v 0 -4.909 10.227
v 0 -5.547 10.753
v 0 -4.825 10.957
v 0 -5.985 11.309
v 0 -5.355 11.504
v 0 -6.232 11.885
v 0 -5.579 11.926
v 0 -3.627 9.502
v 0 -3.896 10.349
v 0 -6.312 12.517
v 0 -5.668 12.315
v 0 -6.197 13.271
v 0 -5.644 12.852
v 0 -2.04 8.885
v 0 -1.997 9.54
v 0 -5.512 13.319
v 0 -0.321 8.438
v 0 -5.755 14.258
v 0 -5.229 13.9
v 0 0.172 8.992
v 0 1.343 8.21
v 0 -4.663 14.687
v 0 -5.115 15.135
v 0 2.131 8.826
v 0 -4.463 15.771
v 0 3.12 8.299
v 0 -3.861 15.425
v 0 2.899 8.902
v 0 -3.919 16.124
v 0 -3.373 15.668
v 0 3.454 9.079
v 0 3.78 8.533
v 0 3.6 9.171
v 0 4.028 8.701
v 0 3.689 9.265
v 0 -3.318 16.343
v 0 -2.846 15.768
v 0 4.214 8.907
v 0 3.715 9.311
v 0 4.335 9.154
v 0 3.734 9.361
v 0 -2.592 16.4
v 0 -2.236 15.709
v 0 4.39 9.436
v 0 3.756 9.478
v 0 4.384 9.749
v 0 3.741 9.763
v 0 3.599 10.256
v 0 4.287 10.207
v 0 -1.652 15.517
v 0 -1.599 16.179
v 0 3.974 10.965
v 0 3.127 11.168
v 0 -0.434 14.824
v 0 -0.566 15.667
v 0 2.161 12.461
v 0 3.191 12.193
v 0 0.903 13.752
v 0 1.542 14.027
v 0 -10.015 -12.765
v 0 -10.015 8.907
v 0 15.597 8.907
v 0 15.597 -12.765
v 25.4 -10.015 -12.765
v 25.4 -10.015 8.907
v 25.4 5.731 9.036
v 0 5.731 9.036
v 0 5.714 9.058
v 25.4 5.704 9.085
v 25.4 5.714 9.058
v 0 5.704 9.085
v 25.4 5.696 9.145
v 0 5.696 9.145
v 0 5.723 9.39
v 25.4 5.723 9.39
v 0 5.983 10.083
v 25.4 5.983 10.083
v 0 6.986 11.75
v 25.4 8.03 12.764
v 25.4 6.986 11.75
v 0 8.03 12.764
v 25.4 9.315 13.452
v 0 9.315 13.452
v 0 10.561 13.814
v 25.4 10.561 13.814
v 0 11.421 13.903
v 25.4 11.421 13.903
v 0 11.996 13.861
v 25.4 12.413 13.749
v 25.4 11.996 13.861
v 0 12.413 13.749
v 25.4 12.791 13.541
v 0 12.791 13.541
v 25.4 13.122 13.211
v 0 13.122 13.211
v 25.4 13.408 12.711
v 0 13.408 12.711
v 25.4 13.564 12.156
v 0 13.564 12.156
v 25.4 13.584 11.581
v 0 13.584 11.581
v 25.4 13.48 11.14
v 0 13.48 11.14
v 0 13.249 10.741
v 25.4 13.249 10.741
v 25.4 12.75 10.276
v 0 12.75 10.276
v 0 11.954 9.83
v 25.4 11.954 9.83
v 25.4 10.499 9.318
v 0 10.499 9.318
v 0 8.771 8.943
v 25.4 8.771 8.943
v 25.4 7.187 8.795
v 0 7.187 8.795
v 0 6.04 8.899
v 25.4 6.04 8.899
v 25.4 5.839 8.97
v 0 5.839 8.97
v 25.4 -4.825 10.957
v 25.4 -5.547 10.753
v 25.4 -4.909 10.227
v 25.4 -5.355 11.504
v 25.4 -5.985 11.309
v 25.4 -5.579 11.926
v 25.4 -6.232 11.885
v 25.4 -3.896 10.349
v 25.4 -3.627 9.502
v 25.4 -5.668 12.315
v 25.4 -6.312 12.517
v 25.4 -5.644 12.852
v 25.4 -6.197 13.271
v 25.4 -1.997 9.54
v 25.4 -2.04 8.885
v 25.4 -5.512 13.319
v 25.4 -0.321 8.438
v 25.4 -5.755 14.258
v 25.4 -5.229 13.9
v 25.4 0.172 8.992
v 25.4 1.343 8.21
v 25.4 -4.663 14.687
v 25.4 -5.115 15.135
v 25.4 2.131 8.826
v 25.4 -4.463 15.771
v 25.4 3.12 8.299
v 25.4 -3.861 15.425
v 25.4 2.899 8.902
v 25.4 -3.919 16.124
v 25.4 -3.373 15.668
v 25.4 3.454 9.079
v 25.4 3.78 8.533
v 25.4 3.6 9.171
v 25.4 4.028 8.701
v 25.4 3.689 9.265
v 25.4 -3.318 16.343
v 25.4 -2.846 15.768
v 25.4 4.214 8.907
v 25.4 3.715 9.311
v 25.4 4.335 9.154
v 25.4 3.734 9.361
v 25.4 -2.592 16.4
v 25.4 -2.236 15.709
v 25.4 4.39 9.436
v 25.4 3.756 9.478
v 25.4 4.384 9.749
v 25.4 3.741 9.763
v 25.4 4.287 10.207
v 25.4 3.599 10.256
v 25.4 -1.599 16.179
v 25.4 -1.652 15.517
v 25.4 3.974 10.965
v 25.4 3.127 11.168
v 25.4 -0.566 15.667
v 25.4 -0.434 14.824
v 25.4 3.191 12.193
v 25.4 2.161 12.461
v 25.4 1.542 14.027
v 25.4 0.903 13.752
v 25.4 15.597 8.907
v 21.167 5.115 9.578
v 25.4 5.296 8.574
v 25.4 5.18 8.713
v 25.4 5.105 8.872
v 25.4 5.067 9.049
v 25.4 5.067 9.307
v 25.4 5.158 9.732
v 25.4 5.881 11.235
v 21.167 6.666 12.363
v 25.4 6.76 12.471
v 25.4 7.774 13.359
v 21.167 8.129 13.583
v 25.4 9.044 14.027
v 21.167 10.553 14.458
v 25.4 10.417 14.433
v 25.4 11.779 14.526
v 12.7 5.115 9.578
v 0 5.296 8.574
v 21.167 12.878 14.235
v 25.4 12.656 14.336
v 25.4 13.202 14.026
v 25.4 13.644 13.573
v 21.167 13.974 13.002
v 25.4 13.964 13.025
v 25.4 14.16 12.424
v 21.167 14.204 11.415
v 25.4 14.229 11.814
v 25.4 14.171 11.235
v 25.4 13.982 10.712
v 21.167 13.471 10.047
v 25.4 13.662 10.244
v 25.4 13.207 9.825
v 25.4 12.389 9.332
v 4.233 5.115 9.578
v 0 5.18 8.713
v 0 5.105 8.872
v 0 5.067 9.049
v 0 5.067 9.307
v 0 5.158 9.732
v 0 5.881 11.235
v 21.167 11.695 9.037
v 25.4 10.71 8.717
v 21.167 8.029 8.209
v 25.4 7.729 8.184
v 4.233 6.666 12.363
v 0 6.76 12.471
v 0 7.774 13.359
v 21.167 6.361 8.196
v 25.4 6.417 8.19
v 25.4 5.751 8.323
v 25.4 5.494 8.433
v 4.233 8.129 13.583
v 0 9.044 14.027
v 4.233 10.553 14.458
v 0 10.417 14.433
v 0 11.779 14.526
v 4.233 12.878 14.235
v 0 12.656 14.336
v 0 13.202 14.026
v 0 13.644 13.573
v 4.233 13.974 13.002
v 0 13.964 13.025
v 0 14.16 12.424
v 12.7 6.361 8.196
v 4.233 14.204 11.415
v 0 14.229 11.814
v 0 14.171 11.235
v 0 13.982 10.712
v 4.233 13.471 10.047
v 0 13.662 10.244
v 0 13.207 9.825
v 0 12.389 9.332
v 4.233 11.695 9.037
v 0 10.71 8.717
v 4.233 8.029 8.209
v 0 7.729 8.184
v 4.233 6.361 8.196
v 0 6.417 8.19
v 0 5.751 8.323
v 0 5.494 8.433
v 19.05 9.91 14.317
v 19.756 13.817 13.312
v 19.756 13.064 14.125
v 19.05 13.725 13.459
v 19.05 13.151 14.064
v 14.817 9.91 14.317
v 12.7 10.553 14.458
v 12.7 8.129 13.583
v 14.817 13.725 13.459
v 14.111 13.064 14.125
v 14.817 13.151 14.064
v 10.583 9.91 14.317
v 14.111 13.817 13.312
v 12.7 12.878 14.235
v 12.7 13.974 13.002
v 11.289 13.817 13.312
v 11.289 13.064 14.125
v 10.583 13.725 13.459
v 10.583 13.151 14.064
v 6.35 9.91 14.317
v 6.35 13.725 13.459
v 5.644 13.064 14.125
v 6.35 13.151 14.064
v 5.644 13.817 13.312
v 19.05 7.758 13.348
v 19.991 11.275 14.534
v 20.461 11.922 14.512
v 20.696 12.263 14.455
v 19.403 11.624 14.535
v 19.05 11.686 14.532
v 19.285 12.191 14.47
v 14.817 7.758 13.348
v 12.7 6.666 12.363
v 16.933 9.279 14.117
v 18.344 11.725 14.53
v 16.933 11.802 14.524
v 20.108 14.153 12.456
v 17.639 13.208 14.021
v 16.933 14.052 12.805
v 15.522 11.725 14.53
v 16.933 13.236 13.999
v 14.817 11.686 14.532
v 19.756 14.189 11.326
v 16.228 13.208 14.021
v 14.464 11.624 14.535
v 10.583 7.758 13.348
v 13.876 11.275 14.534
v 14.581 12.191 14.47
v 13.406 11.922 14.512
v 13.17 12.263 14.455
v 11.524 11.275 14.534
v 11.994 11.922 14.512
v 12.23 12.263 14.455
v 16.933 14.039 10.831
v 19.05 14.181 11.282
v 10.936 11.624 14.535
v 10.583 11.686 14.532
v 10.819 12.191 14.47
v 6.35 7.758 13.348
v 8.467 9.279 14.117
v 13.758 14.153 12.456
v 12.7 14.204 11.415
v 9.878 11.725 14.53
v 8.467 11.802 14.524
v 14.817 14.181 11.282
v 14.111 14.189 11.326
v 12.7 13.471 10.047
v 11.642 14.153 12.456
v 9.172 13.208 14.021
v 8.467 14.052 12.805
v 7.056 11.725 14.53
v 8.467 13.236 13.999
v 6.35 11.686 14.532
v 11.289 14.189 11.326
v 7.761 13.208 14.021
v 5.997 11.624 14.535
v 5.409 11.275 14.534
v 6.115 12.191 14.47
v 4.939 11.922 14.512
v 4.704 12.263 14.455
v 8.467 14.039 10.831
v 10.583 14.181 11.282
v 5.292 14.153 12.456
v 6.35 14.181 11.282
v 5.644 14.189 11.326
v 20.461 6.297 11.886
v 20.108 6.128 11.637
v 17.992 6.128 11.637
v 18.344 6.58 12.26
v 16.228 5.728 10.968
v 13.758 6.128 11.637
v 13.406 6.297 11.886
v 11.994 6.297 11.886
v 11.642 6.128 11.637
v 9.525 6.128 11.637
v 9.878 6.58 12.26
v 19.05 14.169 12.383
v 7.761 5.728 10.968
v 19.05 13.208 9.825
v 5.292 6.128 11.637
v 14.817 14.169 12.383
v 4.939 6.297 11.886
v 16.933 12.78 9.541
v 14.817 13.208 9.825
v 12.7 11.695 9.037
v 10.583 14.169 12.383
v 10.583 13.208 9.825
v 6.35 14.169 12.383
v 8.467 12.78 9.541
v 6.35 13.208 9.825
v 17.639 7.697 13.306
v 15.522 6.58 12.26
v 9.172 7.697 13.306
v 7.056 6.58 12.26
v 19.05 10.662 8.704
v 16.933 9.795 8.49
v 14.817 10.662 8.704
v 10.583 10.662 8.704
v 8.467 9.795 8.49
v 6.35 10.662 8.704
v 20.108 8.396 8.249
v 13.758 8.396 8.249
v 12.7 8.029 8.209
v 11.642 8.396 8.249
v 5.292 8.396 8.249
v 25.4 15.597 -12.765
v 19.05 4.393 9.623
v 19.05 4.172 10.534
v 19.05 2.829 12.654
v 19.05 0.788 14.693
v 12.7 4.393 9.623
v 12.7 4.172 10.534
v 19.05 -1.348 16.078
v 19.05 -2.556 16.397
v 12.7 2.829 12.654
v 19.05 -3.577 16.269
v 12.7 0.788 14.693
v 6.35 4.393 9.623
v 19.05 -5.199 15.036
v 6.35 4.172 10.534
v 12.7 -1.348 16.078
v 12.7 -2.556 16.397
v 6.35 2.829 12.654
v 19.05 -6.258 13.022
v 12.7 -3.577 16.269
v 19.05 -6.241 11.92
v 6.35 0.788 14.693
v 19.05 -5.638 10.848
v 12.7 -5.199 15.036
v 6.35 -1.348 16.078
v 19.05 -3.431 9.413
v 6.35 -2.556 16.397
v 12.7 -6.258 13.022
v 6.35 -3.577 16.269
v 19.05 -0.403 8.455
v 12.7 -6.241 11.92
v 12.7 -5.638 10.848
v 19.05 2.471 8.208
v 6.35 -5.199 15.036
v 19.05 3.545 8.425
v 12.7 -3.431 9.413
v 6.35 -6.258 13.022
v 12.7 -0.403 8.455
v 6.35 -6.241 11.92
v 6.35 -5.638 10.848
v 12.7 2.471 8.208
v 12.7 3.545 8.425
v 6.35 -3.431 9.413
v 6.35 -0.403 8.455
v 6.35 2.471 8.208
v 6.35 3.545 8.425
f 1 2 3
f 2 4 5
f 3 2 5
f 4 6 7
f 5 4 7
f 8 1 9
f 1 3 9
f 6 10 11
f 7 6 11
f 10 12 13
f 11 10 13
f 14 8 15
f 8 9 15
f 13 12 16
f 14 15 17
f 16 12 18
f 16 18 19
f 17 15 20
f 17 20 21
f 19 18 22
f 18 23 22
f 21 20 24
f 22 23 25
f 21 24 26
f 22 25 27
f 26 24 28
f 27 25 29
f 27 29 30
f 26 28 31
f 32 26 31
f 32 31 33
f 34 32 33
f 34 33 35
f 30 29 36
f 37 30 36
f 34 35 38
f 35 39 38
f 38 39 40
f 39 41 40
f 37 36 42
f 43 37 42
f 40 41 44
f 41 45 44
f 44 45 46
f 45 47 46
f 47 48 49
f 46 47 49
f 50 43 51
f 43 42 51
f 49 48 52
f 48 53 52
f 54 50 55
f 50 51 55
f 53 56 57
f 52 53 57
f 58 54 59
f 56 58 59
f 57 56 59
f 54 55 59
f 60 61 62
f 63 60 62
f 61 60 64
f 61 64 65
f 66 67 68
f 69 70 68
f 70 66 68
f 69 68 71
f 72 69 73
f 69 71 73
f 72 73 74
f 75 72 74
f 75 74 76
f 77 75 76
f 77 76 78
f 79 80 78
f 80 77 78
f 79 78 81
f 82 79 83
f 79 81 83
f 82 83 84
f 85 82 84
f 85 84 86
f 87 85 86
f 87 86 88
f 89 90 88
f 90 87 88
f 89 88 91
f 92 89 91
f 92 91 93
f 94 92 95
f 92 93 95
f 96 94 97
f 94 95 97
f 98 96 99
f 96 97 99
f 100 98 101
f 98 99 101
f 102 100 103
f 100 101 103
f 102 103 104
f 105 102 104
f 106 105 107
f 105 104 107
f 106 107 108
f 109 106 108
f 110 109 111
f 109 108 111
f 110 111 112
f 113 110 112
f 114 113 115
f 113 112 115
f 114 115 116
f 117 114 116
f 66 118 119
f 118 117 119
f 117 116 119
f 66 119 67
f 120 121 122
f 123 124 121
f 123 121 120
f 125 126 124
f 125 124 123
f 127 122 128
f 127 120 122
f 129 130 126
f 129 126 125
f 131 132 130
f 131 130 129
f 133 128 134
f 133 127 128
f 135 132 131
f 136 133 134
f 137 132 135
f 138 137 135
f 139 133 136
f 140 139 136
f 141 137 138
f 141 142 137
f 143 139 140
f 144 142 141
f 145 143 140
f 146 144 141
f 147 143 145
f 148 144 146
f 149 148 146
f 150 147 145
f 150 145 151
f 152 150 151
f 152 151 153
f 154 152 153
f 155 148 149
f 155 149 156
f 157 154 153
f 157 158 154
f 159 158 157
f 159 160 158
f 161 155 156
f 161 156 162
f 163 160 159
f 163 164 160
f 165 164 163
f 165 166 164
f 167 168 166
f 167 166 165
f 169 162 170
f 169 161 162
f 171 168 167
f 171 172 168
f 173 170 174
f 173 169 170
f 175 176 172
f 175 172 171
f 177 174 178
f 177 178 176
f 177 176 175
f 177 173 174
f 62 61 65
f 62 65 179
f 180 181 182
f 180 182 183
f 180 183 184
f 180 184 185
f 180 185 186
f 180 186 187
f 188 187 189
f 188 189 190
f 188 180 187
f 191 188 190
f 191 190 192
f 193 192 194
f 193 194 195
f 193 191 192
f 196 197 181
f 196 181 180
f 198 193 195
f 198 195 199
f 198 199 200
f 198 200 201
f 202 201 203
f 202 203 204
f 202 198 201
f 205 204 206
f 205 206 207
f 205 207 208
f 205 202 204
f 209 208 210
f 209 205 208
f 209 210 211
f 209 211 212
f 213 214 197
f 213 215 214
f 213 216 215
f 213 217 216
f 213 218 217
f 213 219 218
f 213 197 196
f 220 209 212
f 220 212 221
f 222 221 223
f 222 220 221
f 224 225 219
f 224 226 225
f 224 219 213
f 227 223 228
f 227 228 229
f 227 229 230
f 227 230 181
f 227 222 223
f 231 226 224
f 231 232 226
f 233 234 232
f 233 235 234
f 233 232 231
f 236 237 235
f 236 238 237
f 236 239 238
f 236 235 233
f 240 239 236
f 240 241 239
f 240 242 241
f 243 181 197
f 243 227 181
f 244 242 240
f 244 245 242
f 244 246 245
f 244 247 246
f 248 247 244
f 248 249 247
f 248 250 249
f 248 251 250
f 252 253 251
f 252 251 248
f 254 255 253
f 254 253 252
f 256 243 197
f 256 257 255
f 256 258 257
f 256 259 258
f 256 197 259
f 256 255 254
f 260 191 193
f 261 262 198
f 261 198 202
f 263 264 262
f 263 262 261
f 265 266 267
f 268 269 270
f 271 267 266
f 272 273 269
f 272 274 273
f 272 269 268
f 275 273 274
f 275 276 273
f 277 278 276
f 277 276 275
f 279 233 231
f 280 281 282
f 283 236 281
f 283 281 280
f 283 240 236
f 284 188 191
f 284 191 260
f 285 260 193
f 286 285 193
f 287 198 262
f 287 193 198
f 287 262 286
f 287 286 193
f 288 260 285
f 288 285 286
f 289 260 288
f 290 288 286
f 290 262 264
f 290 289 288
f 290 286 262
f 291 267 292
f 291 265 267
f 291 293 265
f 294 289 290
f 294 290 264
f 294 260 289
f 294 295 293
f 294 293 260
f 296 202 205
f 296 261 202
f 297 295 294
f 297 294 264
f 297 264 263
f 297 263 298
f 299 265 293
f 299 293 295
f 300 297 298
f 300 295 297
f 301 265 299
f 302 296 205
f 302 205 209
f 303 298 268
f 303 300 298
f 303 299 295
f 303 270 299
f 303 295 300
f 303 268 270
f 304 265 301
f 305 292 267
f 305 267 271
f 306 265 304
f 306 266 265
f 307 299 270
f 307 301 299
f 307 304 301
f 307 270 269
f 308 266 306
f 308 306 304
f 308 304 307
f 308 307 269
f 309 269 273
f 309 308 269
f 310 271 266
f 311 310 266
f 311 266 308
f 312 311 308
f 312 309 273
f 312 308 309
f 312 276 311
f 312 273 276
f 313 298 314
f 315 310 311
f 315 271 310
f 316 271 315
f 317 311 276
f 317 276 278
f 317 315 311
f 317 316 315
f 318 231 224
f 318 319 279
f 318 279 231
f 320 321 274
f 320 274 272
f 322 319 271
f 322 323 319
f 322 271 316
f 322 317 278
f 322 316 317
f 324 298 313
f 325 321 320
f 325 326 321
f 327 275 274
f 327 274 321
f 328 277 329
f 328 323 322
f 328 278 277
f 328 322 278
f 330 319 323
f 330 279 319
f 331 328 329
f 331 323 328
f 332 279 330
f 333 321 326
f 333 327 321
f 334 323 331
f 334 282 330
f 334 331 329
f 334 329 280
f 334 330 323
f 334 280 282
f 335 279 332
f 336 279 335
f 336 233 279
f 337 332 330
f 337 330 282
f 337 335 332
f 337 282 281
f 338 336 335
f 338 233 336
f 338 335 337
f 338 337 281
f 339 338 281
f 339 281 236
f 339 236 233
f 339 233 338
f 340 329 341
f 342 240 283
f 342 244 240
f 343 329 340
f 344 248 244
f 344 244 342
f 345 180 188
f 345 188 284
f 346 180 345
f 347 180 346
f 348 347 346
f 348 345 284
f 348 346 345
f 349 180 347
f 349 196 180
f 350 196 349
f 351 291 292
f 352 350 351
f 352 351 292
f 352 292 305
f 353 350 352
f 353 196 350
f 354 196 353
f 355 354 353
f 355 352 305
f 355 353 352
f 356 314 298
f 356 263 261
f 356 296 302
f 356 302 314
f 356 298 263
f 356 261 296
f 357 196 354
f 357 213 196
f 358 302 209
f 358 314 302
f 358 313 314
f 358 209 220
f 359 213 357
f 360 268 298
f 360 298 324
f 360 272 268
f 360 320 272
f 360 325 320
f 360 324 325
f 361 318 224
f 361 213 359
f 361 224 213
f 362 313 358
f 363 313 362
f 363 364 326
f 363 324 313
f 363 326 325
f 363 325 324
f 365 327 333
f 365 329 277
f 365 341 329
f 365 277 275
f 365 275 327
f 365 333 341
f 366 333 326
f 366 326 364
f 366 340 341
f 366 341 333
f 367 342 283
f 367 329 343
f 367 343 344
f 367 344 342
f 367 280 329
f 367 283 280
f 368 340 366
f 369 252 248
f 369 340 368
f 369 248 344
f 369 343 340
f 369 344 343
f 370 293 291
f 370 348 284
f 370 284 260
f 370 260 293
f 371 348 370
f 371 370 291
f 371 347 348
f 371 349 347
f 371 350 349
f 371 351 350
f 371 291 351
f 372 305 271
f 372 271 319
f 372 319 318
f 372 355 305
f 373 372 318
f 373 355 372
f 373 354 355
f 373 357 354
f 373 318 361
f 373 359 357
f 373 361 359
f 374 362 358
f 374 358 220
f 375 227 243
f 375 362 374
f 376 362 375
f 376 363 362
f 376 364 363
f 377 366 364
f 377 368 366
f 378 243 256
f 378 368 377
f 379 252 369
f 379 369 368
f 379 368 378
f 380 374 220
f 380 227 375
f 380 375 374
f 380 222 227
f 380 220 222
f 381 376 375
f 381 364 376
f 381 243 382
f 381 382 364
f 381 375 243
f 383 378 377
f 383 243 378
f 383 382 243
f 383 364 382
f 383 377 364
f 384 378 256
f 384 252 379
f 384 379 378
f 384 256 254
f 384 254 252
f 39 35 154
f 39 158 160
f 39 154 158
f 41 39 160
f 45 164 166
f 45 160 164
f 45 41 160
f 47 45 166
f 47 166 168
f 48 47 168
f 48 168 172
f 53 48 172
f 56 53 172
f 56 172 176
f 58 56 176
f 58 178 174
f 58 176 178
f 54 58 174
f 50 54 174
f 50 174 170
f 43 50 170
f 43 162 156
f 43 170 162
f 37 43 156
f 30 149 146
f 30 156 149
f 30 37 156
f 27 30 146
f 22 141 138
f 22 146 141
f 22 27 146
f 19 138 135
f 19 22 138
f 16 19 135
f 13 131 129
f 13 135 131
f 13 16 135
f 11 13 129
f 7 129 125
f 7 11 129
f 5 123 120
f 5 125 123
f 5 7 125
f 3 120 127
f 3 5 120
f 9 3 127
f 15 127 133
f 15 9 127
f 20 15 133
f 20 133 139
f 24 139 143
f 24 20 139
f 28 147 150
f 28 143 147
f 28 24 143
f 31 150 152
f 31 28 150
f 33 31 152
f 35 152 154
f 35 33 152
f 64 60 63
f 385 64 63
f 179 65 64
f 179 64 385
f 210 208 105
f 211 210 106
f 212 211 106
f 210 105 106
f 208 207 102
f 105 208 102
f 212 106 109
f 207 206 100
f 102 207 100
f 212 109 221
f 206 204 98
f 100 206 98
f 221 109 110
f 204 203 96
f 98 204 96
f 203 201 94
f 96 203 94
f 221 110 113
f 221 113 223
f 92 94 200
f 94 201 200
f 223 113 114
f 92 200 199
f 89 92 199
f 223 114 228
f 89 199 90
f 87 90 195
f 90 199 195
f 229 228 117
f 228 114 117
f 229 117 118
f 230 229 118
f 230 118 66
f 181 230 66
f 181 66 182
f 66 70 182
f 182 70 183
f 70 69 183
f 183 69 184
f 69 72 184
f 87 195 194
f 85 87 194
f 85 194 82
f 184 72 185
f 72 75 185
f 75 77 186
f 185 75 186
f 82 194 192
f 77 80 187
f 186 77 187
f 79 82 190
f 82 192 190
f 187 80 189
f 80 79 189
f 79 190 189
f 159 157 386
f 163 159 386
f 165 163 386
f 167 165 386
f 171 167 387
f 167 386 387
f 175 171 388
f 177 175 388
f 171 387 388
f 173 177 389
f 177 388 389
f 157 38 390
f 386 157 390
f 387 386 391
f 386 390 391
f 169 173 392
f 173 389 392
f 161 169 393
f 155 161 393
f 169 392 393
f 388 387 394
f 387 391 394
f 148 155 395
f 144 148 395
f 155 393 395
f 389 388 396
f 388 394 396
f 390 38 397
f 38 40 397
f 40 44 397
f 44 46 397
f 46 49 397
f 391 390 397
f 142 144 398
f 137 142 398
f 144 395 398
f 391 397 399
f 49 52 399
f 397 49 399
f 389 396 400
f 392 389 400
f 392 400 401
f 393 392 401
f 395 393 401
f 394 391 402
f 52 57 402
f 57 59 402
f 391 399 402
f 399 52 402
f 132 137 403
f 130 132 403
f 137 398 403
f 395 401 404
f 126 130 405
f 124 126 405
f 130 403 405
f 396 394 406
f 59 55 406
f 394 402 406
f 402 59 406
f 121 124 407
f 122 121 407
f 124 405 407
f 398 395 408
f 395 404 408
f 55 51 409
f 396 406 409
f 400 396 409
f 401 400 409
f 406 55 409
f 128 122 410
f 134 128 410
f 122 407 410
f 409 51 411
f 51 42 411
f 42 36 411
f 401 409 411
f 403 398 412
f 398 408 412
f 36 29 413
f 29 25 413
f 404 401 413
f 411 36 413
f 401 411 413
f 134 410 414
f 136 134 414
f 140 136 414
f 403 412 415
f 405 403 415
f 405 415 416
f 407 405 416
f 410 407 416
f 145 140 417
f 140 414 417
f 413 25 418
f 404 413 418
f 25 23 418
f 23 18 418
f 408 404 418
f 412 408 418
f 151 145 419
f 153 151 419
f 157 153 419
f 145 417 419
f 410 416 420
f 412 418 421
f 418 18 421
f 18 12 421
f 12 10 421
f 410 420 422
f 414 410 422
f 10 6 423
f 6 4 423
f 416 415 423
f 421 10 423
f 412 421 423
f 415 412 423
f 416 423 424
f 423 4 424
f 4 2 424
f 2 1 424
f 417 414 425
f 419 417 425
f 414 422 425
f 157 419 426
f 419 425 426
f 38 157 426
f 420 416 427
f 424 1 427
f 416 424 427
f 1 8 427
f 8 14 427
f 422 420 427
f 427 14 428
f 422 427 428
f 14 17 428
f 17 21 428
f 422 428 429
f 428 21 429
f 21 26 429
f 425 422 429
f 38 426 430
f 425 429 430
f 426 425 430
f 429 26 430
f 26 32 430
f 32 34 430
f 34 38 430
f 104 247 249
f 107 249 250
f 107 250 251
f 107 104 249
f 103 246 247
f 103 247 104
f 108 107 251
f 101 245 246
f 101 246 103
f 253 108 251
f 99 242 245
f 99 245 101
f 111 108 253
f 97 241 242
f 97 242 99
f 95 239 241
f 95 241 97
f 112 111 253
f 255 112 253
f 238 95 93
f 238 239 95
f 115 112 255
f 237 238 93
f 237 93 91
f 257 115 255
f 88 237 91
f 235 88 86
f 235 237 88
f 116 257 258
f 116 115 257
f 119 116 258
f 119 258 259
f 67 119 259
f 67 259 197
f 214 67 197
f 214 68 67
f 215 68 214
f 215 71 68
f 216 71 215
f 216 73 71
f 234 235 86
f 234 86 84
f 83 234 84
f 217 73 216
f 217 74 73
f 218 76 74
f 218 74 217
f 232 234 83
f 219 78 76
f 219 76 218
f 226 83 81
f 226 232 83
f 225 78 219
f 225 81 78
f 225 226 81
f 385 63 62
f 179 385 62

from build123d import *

# Parameters (mm, degrees)
F0_W     = 25.6118457764
F0_H     = 21.6715615243
F2_DEPTH = 25.4
F3_DEPTH = 25.4
F5_DEPTH = 25.4
F7_T     = -0.635
F8_T     = -0.635


with BuildPart() as f2:
    # F0 (on Right) → F2 (new body)
    with BuildSketch(Plane.YZ):
        with Locations((2.7907509357, -1.9287774339)):
            Rectangle(F0_W, F0_H)
    extrude(amount=F2_DEPTH)


with BuildPart() as f3:
    # F1 (on Right) → F3 (new body)
    with BuildSketch(Plane.YZ):
        with BuildLine():
            add(Edge.make_bspline(
                [(4.2136316188, 8.9070033282), (5.2935795792, 10.4919461084), (-1.3555377635, 17.8607368612), (-5.4459300601, 15.4761674557), (-8.0517569971, 9.6811419469), (3.0776302522, 7.2397959902), (4.2136316188, 8.9070033282)],
                knots=[0, 0, 0, 0, 0.2944452308, 0.4896865614, 0.6902719419, 1, 1, 1, 1], degree=3))
        make_face()
    extrude(amount=F3_DEPTH)

    # F8
    f8_openings = [f3.faces().sort_by_distance(p)[0] for p in [
        (25.4, -1.151764, 12.011421),
        (0, -1.151764, 12.011421),
    ]]
    offset(amount=F8_T, openings=f8_openings, kind=Kind.INTERSECTION)


with BuildPart() as f5:
    # F4 (on face) → F5 (new body)
    with BuildSketch(Plane.YZ):
        with BuildLine():
            add(Edge.make_bspline(
                [(5.2957590669, 9.8436884582), (4.7815324939, 10.327226453), (5.7340432111, 12.4667739571), (7.6707529357, 15.2182754562), (13.3232593959, 16.5692283812), (14.828232512, 12.3344833298), (12.1238035013, 9.8722782318), (6.1509417623, 9.039542295), (5.2957590669, 9.8436884582)],
                knots=[0, 0, 0, 0, 0.1292467129, 0.2917185614, 0.4775120133, 0.6272887936, 0.7850567083, 1, 1, 1, 1], degree=3))
        make_face()
    extrude(amount=F5_DEPTH)


with BuildPart() as f5_1:
    # F6: moved
    add(f5.part.moved(Location((0, 0, -1.27))))

    # F7
    f7_openings = [f5_1.faces().sort_by_distance(p)[0] for p in [
        (0, 9.801206, 11.224016),
        (25.4, 9.801206, 11.224016),
    ]]
    offset(amount=F7_T, openings=f7_openings, kind=Kind.INTERSECTION)


solid = Compound([f2.part, f3.part, f5_1.part])
